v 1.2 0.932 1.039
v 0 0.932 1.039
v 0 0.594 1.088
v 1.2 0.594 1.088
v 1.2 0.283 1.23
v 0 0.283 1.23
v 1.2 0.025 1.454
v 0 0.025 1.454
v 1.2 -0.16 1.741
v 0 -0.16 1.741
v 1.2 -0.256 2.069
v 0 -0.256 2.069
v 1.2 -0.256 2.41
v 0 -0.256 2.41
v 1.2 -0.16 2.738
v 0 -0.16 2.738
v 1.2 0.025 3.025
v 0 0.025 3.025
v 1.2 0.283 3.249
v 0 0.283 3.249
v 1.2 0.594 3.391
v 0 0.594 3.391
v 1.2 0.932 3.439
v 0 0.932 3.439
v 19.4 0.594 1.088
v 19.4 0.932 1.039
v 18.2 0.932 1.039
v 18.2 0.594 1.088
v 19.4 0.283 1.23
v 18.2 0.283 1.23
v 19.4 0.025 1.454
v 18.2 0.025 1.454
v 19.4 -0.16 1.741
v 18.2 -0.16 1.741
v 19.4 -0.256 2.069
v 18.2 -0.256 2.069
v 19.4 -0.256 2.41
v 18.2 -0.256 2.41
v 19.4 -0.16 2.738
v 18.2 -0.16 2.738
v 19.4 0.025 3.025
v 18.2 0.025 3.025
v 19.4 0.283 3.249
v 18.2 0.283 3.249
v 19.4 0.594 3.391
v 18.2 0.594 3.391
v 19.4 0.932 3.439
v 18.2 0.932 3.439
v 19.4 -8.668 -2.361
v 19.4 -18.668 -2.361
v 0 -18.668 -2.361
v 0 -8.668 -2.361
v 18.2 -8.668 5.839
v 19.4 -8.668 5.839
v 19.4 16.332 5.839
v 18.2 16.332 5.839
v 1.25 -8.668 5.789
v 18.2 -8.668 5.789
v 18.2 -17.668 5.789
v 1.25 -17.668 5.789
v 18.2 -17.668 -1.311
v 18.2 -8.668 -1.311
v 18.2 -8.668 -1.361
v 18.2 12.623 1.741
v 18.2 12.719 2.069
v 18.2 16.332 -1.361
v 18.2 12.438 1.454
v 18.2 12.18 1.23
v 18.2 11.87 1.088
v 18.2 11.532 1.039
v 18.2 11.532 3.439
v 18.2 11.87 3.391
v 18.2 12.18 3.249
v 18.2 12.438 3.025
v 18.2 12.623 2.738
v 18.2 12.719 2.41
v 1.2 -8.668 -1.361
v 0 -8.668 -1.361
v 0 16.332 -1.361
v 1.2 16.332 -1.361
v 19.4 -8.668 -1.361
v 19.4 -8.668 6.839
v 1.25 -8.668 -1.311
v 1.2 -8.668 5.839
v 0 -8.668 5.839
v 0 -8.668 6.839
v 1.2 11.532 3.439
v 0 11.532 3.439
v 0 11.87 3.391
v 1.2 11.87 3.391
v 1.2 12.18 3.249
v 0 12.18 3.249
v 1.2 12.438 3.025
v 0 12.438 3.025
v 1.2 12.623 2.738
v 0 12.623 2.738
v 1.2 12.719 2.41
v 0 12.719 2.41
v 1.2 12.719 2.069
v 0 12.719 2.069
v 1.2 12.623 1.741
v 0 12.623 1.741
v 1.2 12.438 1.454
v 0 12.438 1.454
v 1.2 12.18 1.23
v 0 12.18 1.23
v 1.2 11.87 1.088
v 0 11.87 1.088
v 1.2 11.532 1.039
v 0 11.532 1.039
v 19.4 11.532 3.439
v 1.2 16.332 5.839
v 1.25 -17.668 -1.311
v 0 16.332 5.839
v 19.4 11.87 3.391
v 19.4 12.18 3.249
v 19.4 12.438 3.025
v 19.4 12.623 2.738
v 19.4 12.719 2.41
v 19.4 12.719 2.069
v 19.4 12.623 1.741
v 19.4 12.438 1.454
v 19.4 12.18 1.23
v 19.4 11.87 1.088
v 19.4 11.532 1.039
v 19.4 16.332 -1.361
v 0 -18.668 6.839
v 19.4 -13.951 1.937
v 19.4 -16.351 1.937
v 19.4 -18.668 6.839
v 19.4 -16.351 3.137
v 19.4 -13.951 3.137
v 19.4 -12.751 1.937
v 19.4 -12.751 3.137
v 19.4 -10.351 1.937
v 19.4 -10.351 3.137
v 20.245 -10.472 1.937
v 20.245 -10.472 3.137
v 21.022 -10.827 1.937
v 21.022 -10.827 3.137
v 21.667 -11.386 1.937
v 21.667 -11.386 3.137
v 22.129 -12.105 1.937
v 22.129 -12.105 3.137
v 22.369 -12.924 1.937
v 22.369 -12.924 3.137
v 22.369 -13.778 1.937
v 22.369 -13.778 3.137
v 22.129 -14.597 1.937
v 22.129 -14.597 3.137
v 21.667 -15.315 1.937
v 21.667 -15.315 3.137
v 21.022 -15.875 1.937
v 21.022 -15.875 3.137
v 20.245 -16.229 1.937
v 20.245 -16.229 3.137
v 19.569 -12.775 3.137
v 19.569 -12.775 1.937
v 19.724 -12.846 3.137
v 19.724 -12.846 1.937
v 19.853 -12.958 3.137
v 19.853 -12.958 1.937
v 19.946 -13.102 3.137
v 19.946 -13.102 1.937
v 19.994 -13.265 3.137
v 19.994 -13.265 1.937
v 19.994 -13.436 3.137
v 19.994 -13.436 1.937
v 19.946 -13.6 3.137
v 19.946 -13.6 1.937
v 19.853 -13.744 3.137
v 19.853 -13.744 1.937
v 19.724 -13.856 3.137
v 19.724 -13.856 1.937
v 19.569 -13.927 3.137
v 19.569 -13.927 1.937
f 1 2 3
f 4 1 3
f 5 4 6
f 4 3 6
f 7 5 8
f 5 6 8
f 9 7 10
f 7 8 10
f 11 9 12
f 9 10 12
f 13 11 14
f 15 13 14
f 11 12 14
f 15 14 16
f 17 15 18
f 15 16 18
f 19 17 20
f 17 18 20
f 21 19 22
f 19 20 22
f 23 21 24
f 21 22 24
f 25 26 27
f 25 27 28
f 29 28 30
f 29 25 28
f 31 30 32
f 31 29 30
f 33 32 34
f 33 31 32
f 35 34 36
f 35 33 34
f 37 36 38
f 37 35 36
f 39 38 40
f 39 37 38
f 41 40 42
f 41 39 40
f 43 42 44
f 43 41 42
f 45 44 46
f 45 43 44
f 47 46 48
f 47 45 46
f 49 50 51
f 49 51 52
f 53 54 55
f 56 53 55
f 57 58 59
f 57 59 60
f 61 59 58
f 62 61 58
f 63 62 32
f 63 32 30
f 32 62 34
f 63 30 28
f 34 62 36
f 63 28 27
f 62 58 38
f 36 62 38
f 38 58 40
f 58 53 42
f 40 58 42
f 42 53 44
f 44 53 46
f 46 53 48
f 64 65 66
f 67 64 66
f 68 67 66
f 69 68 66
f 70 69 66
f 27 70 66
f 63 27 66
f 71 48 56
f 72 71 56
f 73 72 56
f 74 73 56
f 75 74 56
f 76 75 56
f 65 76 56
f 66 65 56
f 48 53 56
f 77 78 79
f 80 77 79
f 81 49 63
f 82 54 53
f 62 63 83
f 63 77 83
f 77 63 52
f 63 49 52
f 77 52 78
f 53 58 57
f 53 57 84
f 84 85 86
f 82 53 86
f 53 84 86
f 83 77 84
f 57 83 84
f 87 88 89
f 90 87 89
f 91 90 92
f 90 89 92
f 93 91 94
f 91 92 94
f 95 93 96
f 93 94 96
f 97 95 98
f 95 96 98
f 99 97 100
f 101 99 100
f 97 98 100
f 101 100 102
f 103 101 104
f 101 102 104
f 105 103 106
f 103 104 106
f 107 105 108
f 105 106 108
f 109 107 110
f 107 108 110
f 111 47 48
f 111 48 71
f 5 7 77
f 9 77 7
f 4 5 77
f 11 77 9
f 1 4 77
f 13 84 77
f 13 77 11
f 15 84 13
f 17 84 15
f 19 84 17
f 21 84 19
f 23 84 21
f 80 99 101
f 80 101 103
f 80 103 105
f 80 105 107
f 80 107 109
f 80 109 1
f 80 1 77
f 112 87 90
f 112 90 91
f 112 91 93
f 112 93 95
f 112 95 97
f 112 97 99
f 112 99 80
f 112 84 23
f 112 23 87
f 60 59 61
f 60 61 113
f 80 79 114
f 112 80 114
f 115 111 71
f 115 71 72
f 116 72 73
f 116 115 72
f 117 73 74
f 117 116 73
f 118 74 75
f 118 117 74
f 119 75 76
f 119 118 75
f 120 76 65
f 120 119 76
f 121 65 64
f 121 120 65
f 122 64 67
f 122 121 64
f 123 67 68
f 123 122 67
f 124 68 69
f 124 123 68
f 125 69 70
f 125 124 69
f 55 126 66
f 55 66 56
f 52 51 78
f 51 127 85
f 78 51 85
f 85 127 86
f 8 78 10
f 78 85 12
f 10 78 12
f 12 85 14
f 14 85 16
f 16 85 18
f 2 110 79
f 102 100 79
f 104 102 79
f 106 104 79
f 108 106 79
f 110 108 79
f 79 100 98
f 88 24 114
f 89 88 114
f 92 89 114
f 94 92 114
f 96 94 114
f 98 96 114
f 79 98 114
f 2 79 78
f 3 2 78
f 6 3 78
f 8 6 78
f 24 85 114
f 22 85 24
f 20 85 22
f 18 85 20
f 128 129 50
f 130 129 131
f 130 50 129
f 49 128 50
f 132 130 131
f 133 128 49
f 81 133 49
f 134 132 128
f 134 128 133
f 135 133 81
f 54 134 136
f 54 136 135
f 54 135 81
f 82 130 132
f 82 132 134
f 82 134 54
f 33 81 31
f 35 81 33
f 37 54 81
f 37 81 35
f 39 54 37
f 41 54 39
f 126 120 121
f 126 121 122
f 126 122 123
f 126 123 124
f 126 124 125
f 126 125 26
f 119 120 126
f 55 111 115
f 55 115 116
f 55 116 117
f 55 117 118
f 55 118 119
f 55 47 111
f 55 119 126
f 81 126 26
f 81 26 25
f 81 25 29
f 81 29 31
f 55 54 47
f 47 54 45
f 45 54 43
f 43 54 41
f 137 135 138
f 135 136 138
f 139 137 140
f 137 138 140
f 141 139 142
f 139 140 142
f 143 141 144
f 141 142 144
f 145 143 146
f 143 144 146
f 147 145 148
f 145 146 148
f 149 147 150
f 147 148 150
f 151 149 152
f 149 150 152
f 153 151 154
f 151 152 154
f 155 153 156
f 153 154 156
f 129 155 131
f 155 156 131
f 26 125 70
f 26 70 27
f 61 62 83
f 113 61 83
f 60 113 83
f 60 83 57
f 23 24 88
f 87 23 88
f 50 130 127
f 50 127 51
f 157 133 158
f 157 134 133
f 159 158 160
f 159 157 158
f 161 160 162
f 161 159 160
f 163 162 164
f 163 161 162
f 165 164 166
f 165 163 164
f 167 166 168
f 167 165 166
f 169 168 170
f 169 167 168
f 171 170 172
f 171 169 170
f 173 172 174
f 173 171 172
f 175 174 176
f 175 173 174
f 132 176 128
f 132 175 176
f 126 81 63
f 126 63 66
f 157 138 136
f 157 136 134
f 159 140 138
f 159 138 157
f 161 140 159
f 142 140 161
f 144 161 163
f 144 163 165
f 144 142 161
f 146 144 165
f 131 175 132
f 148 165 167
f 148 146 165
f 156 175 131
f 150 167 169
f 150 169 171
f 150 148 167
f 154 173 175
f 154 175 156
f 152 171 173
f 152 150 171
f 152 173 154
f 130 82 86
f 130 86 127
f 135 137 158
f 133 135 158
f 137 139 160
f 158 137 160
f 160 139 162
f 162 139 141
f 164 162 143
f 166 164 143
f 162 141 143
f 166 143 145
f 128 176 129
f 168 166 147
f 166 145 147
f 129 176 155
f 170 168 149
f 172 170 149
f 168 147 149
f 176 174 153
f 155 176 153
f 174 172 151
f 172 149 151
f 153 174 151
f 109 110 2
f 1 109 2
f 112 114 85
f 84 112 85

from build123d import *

# Parameters (mm, degrees)
F1_DEPTH = 19.4
F2_DEPTH = 1.2
F3_W     = 25
F3_H     = 7.2
F4_DEPTH = 1.2
F5_W     = 16.95
F5_H     = 7.1
F6_DEPTH = 9
F7_W     = 2.4
F7_H     = 1.2
F8_ANGLE = 180


with BuildPart() as f1:
    # F0 (on Right) → F1 (new body)
    with BuildSketch(Plane.YZ):
        Polygon((-8.668413, 6.839403), (-18.668413, 6.839403), (-18.668413, -2.360597), (-8.668413, -2.360597), (-8.668413, -1.360597), (-8.668413, 2.239403), (-8.668413, 5.839403), align=None)
    extrude(amount=F1_DEPTH)

    # F0 (on Right) → F2 (join)
    with BuildSketch(Plane.YZ):
        Polygon((-8.668413, 6.839403), (-18.668413, 6.839403), (-18.668413, -2.360597), (-8.668413, -2.360597), (-8.668413, -1.360597), (-8.668413, 2.239403), (-8.668413, 5.839403), align=None)
        Polygon((16.331587, 5.839403), (-8.668413, 5.839403), (-8.668413, 2.239403), (-8.668413, -1.360597), (16.331587, -1.360597), align=None)
        with BuildLine():
            ThreePointArc((11.531587, 3.439403), (12.731587, 2.239403), (11.531587, 1.039403))
            Line((11.531587, 1.039403), (0.931587, 1.039403))
            ThreePointArc((0.931587, 1.039403), (-0.268413, 2.239403), (0.931587, 3.439403))
            Line((0.931587, 3.439403), (11.531587, 3.439403))
        make_face(mode=Mode.SUBTRACT)
    extrude(amount=F2_DEPTH)

    # F3 (on face) → F4 (join)
    with BuildSketch(Plane.YZ.offset(19.4)):
        with Locations((3.831587, 2.239403)):
            Rectangle(F3_W, F3_H)
        with BuildLine():
            ThreePointArc((11.531587, 3.439403), (12.731587, 2.239403), (11.531587, 1.039403))
            Line((11.531587, 1.039403), (0.931587, 1.039403))
            ThreePointArc((0.931587, 1.039403), (-0.268413, 2.239403), (0.931587, 3.439403))
            Line((0.931587, 3.439403), (11.531587, 3.439403))
        make_face(mode=Mode.SUBTRACT)
    extrude(amount=-F4_DEPTH)

    # F5 (on face) → F6 (cut)
    with BuildSketch(Plane(origin=(0, -8.668413, 0), x_dir=(-1, 0, 0), z_dir=(0, 1, 0))):
        with Locations((-9.725, 2.239403)):
            Rectangle(F5_W, F5_H)
    extrude(amount=-F6_DEPTH, mode=Mode.SUBTRACT)

    # F7 (on face) → F8 (revolve)
    with BuildSketch(Plane.YZ.offset(19.4)):
        with Locations((-11.550809, 2.537114)):
            Rectangle(F7_W, F7_H)
    revolve(axis=Axis((19.4, -13.350809, 2.537114), (0, 0, -1)), revolution_arc=F8_ANGLE)


solid = f1.part
